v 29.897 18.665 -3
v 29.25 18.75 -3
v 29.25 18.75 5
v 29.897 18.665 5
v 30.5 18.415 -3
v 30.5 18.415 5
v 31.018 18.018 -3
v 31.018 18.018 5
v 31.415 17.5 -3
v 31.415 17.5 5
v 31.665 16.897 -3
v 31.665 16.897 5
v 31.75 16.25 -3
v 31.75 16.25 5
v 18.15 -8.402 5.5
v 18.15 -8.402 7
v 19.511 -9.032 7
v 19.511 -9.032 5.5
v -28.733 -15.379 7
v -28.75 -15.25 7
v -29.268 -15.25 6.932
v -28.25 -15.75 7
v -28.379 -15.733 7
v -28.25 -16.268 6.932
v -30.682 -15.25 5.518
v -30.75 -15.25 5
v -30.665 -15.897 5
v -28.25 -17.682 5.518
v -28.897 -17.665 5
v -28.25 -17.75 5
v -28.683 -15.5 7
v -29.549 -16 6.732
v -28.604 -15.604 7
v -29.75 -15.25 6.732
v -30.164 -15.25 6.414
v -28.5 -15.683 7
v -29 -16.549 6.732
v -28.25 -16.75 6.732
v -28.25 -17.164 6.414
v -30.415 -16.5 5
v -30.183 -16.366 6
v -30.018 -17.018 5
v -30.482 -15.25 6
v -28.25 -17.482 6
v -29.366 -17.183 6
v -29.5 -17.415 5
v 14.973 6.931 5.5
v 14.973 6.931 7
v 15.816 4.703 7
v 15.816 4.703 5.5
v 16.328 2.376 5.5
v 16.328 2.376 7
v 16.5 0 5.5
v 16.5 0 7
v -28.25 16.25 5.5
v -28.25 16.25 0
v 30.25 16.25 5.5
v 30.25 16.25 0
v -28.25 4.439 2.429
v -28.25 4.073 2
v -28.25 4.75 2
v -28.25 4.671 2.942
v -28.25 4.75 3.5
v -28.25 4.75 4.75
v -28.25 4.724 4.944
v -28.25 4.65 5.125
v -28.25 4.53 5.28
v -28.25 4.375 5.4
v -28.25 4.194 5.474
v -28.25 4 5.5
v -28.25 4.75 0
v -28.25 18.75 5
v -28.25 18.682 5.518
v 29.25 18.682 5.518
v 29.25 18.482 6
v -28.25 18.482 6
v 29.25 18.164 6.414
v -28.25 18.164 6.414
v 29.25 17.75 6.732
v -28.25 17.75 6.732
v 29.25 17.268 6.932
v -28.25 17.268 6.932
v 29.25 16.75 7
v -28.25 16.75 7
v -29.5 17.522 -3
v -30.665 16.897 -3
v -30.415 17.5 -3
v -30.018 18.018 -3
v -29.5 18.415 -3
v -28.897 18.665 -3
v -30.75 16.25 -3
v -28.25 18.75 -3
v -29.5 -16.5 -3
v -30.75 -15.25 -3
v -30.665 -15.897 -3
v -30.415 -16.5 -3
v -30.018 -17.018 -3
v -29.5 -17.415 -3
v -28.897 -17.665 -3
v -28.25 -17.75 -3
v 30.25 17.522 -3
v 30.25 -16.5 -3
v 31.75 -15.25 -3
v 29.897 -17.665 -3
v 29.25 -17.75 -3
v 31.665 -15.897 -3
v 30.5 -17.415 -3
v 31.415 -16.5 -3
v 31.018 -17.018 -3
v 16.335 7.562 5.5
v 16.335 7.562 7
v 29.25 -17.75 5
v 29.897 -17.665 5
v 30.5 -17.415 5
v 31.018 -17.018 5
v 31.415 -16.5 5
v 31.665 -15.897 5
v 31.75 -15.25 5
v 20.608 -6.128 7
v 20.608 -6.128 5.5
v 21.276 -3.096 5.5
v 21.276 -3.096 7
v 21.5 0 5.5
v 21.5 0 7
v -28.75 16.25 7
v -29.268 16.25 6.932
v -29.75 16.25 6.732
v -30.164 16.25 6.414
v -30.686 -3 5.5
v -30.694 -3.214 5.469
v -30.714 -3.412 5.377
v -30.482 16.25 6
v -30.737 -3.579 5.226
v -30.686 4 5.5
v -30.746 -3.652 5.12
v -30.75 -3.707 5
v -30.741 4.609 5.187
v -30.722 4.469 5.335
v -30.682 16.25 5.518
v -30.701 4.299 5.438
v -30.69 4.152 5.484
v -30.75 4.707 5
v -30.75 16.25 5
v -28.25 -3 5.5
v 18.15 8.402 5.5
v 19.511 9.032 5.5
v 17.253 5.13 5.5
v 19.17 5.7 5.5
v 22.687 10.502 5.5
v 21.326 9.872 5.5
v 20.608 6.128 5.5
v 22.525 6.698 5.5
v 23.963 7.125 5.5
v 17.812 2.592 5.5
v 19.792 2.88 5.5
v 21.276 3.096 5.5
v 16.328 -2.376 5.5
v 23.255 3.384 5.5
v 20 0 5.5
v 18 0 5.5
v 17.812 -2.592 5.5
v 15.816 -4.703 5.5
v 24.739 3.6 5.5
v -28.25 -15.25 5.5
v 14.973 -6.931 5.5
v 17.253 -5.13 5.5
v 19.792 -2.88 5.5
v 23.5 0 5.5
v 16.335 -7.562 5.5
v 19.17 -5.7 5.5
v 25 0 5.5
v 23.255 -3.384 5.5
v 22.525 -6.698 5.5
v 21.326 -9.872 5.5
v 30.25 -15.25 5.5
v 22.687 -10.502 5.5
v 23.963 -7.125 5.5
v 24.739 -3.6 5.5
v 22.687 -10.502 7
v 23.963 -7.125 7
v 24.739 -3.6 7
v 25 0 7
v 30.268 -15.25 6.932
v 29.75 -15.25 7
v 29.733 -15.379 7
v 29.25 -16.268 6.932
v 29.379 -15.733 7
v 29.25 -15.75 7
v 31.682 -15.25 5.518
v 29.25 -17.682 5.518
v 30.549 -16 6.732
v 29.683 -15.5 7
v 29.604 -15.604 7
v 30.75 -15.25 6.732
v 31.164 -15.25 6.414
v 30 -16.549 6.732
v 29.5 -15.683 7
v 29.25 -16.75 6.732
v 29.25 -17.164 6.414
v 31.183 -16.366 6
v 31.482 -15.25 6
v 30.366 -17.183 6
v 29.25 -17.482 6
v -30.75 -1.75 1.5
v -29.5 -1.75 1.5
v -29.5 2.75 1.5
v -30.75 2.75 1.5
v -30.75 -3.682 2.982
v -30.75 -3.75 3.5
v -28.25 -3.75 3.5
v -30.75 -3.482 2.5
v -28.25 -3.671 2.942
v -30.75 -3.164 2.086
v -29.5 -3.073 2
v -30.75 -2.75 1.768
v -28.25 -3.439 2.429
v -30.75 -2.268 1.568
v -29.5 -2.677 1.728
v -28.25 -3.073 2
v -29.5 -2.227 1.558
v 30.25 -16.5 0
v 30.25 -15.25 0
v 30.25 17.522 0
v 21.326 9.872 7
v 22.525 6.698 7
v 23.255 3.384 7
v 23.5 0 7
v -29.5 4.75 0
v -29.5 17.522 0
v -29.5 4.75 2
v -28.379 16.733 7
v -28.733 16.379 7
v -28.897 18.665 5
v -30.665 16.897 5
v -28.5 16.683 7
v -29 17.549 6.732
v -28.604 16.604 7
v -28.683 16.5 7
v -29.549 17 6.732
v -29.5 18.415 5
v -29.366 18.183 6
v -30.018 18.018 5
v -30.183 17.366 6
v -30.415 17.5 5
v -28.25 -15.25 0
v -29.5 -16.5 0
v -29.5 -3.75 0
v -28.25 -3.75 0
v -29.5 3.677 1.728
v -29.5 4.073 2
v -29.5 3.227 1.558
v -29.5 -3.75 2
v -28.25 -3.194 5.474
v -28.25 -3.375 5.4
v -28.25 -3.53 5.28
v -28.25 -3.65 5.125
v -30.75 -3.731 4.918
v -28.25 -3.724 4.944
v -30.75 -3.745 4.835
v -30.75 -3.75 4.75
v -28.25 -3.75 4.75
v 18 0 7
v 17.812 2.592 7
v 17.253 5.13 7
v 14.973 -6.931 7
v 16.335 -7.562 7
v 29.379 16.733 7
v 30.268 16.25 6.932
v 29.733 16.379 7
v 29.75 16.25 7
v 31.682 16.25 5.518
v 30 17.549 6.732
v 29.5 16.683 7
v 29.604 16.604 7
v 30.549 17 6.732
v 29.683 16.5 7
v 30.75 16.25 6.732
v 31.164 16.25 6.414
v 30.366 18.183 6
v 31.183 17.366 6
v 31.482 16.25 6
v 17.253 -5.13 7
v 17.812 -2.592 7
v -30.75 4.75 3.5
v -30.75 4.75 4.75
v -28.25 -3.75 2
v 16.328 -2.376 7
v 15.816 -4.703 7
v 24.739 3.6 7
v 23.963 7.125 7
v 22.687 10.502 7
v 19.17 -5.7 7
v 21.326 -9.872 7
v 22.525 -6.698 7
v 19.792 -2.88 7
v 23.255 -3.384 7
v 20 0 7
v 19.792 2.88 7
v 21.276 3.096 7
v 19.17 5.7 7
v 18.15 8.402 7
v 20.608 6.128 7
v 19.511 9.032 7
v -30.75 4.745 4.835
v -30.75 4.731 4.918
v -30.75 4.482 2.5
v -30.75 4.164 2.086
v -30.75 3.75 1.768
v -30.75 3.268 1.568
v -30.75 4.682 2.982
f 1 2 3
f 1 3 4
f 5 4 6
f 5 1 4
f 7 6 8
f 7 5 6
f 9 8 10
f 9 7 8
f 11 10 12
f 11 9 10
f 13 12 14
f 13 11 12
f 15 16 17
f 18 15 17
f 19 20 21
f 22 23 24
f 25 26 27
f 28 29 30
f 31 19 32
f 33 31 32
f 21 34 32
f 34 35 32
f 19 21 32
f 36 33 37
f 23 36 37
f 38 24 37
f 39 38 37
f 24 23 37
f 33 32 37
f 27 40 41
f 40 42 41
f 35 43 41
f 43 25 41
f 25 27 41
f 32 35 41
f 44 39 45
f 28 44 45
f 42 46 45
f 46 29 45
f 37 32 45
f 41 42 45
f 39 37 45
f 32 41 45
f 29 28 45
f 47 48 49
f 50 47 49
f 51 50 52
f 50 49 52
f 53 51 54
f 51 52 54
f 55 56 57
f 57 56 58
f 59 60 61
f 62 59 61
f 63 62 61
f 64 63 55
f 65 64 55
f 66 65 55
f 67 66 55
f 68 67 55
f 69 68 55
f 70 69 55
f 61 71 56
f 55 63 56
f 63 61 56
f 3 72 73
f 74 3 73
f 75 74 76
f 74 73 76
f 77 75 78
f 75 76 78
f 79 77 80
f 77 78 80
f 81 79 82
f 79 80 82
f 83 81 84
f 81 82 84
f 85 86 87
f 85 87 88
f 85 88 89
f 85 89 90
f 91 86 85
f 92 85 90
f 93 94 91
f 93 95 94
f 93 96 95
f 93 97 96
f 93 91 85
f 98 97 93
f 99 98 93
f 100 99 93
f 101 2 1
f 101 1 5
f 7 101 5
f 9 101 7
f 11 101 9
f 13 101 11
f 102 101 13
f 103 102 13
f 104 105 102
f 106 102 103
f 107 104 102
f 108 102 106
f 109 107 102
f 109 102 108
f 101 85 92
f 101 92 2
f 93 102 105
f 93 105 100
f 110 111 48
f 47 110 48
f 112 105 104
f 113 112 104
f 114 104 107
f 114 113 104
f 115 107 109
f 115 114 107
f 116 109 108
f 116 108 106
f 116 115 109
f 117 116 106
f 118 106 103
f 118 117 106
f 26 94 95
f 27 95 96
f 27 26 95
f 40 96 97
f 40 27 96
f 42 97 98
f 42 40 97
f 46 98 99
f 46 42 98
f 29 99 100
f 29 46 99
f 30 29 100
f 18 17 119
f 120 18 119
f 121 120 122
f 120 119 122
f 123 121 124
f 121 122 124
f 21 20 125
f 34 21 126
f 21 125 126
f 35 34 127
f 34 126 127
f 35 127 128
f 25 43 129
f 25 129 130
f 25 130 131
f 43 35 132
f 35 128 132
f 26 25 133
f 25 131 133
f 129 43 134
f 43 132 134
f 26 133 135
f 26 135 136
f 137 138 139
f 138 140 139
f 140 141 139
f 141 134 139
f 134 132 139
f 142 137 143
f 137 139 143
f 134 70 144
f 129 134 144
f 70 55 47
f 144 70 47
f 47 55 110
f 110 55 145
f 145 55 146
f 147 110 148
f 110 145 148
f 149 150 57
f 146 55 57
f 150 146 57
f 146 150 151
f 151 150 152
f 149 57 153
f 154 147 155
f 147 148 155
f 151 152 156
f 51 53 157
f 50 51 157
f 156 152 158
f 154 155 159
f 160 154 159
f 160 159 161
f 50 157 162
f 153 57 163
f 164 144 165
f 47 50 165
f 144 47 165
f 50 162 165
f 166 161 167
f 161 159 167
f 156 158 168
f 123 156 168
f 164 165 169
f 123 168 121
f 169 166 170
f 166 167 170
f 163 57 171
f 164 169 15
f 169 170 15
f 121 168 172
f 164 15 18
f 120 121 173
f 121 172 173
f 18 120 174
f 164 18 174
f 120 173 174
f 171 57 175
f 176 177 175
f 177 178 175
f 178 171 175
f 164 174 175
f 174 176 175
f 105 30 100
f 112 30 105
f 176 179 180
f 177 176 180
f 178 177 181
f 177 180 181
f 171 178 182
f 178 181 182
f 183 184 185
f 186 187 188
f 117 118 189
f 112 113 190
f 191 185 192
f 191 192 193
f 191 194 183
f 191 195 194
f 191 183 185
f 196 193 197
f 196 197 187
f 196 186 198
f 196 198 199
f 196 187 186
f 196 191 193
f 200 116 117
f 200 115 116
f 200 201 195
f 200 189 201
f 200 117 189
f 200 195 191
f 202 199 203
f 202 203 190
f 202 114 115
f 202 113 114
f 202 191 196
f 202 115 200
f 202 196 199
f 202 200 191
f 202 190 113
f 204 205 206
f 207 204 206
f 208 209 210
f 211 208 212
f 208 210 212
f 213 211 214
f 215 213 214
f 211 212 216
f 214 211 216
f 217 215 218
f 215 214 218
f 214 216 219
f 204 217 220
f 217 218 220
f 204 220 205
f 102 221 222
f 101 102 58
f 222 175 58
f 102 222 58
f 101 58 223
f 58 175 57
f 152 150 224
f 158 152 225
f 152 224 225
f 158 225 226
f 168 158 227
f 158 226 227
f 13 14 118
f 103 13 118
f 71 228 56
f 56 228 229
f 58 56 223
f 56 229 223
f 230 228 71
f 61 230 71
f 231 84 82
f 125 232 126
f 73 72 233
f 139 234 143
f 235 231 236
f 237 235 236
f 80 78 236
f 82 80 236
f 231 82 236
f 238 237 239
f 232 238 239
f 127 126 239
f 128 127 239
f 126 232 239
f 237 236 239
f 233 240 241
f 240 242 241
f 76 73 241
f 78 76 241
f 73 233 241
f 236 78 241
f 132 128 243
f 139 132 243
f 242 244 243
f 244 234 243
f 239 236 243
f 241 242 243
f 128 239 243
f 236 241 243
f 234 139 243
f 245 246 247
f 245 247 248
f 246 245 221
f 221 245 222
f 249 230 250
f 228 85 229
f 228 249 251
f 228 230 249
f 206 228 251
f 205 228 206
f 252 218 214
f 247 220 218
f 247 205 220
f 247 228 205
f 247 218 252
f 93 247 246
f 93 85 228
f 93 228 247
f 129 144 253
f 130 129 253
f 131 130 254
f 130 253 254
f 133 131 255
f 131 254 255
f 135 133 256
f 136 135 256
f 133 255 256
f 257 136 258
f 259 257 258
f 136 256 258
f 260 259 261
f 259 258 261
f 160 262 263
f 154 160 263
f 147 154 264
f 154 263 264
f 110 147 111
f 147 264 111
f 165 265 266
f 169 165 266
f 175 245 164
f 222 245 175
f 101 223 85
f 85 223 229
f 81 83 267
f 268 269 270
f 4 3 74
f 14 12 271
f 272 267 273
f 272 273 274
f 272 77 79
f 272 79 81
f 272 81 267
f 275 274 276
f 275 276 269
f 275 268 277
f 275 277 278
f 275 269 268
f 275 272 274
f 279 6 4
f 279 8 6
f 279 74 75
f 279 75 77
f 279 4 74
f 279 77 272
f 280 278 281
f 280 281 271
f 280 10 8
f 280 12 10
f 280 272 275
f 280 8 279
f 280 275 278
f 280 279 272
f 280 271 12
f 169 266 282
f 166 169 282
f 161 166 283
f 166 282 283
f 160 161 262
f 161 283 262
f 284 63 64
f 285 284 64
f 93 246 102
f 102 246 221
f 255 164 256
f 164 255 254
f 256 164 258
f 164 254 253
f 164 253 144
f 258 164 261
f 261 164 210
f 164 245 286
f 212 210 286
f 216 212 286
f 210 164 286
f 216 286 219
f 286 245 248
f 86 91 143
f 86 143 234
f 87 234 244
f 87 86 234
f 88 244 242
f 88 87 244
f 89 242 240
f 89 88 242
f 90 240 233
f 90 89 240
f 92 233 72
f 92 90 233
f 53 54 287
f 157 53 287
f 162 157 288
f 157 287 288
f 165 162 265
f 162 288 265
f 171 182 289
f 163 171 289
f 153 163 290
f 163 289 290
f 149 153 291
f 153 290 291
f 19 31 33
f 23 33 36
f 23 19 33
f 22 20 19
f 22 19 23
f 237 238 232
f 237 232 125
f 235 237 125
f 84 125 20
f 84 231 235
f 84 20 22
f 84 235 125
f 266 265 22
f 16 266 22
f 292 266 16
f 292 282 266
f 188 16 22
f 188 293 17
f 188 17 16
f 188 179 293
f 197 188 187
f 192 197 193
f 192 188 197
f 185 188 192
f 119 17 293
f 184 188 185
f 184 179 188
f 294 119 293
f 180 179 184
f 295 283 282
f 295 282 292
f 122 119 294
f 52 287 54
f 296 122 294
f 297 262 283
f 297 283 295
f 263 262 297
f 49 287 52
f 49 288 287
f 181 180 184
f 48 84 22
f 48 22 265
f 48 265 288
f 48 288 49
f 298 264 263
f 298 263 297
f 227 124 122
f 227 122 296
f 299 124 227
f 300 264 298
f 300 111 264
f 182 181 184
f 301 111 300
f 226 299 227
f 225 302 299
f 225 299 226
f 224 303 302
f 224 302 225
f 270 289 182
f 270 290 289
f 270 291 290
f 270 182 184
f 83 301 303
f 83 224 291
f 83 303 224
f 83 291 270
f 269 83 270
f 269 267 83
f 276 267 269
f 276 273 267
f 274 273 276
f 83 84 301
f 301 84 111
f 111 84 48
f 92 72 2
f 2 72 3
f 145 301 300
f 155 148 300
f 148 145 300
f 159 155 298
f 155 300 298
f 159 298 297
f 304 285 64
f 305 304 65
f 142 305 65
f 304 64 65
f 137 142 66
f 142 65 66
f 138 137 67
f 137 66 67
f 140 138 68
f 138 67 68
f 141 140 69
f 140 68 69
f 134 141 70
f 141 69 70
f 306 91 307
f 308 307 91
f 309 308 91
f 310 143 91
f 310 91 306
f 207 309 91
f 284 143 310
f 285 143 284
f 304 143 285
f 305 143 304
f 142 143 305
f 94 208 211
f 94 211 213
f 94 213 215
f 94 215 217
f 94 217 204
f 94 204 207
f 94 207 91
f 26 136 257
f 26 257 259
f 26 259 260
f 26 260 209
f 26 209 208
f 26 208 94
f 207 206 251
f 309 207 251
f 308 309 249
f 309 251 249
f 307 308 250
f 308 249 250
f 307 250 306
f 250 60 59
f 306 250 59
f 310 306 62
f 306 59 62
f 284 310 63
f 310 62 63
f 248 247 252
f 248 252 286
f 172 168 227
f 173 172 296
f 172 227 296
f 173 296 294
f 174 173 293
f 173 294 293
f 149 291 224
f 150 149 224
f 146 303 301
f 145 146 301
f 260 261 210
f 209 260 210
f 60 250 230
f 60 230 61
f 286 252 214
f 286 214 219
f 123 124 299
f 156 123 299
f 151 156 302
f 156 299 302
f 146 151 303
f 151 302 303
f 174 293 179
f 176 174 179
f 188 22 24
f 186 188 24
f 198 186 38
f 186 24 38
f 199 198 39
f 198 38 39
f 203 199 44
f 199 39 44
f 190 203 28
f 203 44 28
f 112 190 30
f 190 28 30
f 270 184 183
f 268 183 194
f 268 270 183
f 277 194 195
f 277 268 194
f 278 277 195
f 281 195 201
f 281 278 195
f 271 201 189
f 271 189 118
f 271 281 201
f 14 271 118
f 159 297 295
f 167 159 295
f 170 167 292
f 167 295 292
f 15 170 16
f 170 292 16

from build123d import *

# Parameters (mm, degrees)
F0_W         = 62.5
F0_H         = 36.5
F0_W_2       = 58.5
F0_H_2       = 31.5
F1_DEPTH     = 7
F3_DEPTH     = 1.5
F4_W         = 62.5
F4_H         = 36.5
F5_DEPTH     = 3
F7_DEPTH     = 2.5
F8_R         = 2.5
F9_T1_DEPTH  = 57.5
F9_T3_DEPTH  = 31.5
F9_T6_ANGLE  = 90
F9_T8_ANGLE  = 90
F9_T10_ANGLE = 90
F9_T12_ANGLE = 90
F10_W        = 1.25
F10_H        = 8.5
F11_DEPTH    = 2
F13_DEPTH    = 3


# Not quite as in the source:
# - a fillet or chamfer that OpenCascade refuses, or shapes differently, is made with other operations: its cross-section is extruded or revolved along the edge and cut away or added
# - a feature names something its author has since deleted; it is built from what else it names


with BuildPart() as f1:
    # F0 (on Top) → F1 (new body)
    with BuildSketch(Plane.XY):
        with Locations((0.5, 0.5)):
            Rectangle(F0_W, F0_H)
        with Locations((1, 0.5)):
            Rectangle(F0_W_2, F0_H_2, mode=Mode.SUBTRACT)
    extrude(amount=F1_DEPTH)

    # F2 (on face) → F3 (join)
    with BuildSketch(Plane.XY.offset(7)):
        Polygon((30.25, 16.25), (-28.25, 16.25), (-28.25, -15.25), (30.25, -15.25), (30.25, -6), (30.25, 7), align=None)
    extrude(amount=-F3_DEPTH)

    # F4 (on face) → F5 (join)
    with BuildSketch(Plane(origin=(0, 0, 0), x_dir=(1, 0, 0), z_dir=(0, 0, -1))):
        with Locations((0.5, -0.5)):
            Rectangle(F4_W, F4_H)
        Polygon((-29.5, -17.522141248), (-29.5, 16.5), (30.25, 16.5), (30.25, 15.25), (30.25, -16.25), (30.25, -17.522141248), align=None, mode=Mode.SUBTRACT)
    extrude(amount=F5_DEPTH)

    # F6 (on face) → F7 (cut)
    with BuildSketch(Plane.YZ.offset(-28.25)):
        with BuildLine():
            Line((4, 5.5), (-3, 5.5))
            ThreePointArc((-3, 5.5), (-3.5303300859, 5.2803300859), (-3.75, 4.75))
            Line((-3.75, 4.75), (-3.75, 3.5))
            ThreePointArc((-3.75, 3.5), (-3.1642135624, 2.0857864376), (-1.75, 1.5))
            Line((-1.75, 1.5), (2.75, 1.5))
            ThreePointArc((2.75, 1.5), (4.1642135624, 2.0857864376), (4.75, 3.5))
            Line((4.75, 3.5), (4.75, 4.75))
            ThreePointArc((4.75, 4.75), (4.5303300859, 5.2803300859), (4, 5.5))
        make_face()
    extrude(amount=-F7_DEPTH, mode=Mode.SUBTRACT)

    # F8
    f8_edges = [f1.edges().sort_by_distance(p)[0] for p in [
        (-30.75, 18.75, 2),
        (-30.75, -17.75, 2),
        (31.75, 18.75, 2),
        (31.75, -17.75, 2),
    ]]
    fillet(f8_edges, radius=F8_R)

    # F9: fillet of radius 2 on 8 edges, made by hand

    # F9_s2 → F9_t1 (cut)
    with BuildSketch(Plane.YZ.offset(-28.25)):
        with BuildLine():
            ThreePointArc((18.75, 5), (18.1642135624, 6.4142135624), (16.75, 7))
            Line((16.75, 7), (18.75, 7))
            Line((18.75, 7), (18.75, 5))
        make_face()
        with BuildLine():
            ThreePointArc((-15.75, 7), (-17.1642135624, 6.4142135624), (-17.75, 5))
            Line((-17.75, 5), (-17.75, 7))
            Line((-17.75, 7), (-15.75, 7))
        make_face()
    extrude(amount=F9_T1_DEPTH, mode=Mode.SUBTRACT)

    # F9_s4 → F9_t3 (cut)
    with BuildSketch(Plane.XZ.offset(-16.25)):
        with BuildLine():
            ThreePointArc((29.75, 7), (31.1642135624, 6.4142135624), (31.75, 5))
            Line((31.75, 5), (31.75, 7))
            Line((31.75, 7), (29.75, 7))
        make_face()
        with BuildLine():
            ThreePointArc((-28.75, 7), (-30.1642135624, 6.4142135624), (-30.75, 5))
            Line((-30.75, 5), (-30.75, 7))
            Line((-30.75, 7), (-28.75, 7))
        make_face()
    extrude(amount=F9_T3_DEPTH, mode=Mode.SUBTRACT)

    # F9_s5 → F9_t6 (revolve, cut)
    with BuildSketch(Plane.YZ.offset(29.25)):
        with BuildLine():
            ThreePointArc((16.75, 7), (18.1642135624, 6.4142135624), (18.75, 5))
            Line((18.75, 5), (18.75, 7))
            Line((18.75, 7), (16.75, 7))
        make_face()
    revolve(axis=Axis((29.25, 16.25, 7), (0, 0, -1)), revolution_arc=F9_T6_ANGLE, mode=Mode.SUBTRACT)

    # F9_s7 → F9_t8 (revolve, cut)
    with BuildSketch(Plane.YZ.offset(-28.25)):
        with BuildLine():
            ThreePointArc((16.75, 7), (18.1642135624, 6.4142135624), (18.75, 5))
            Line((18.75, 5), (18.75, 7))
            Line((18.75, 7), (16.75, 7))
        make_face()
    revolve(axis=Axis((-28.25, 16.25, 7), (0, 0, 1)), revolution_arc=F9_T8_ANGLE, mode=Mode.SUBTRACT)

    # F9_s9 → F9_t10 (revolve, cut)
    with BuildSketch(Plane.XZ.offset(15.25)):
        with BuildLine():
            ThreePointArc((29.75, 7), (31.1642135624, 6.4142135624), (31.75, 5))
            Line((31.75, 5), (31.75, 7))
            Line((31.75, 7), (29.75, 7))
        make_face()
    revolve(axis=Axis((29.25, -15.25, 7), (0, 0, -1)), revolution_arc=F9_T10_ANGLE, mode=Mode.SUBTRACT)

    # F9_s11 → F9_t12 (revolve, cut)
    with BuildSketch(Plane.XZ.offset(15.25)):
        with BuildLine():
            ThreePointArc((-28.75, 7), (-30.1642135624, 6.4142135624), (-30.75, 5))
            Line((-30.75, 5), (-30.75, 7))
            Line((-30.75, 7), (-28.75, 7))
        make_face()
    revolve(axis=Axis((-28.25, -15.25, 7), (0, 0, 1)), revolution_arc=F9_T12_ANGLE, mode=Mode.SUBTRACT)

    # F10 (on face) → F11 (cut)
    with BuildSketch(Plane(origin=(0, 0, 0), x_dir=(1, 0, 0), z_dir=(0, 0, -1))):
        with Locations((-28.875, -0.5)):
            Rectangle(F10_W, F10_H)
    extrude(amount=-F11_DEPTH, mode=Mode.SUBTRACT)

    # F12 (on face) → F13 (cut)
    with BuildSketch(Plane.XY.offset(7)):
        with BuildLine():
            ThreePointArc((22.6871086181, -10.5021475209), (24.4149310408, -5.3769082449), (25, 0))
            ThreePointArc((25, 0), (24.4149310408, 5.3769082449), (22.6871086181, 10.5021475209))
            Line((22.6871086181, 10.5021475209), (21.325882101, 9.8720186697))
            ThreePointArc((21.325882101, 9.8720186697), (22.9500351783, 5.0542937502), (23.5, 0))
            ThreePointArc((23.5, 0), (22.9500351783, -5.0542937502), (21.325882101, -9.8720186697))
            Line((21.325882101, -9.8720186697), (22.6871086181, -10.5021475209))
        make_face()
        with BuildLine():
            ThreePointArc((19.5109134115, -9.031846868), (20.9968406951, -4.6241410906), (21.5, 0))
            ThreePointArc((21.5, 0), (20.9968406951, 4.6241410906), (19.5109134115, 9.031846868))
            Line((19.5109134115, 9.031846868), (18.1496868945, 8.4017180168))
            ThreePointArc((18.1496868945, 8.4017180168), (19.5319448326, 4.3015265959), (20, 0))
            ThreePointArc((20, 0), (19.5319448326, -4.3015265959), (18.1496868945, -8.4017180168))
            Line((18.1496868945, -8.4017180168), (19.5109134115, -9.031846868))
        make_face()
        with BuildLine():
            ThreePointArc((16.334718205, -7.5615462151), (17.5787503494, -3.8713739363), (18, 0))
            ThreePointArc((18, 0), (17.5787503494, 3.8713739363), (16.334718205, 7.5615462151))
            Line((16.334718205, 7.5615462151), (14.9734916879, 6.9314173638))
            ThreePointArc((14.9734916879, 6.9314173638), (16.1138544869, 3.5487594416), (16.5, 0))
            ThreePointArc((16.5, 0), (16.1138544869, -3.5487594416), (14.9734916879, -6.9314173638))
            Line((14.9734916879, -6.9314173638), (16.334718205, -7.5615462151))
        make_face()
    extrude(amount=-F13_DEPTH, mode=Mode.SUBTRACT)


solid = f1.part
